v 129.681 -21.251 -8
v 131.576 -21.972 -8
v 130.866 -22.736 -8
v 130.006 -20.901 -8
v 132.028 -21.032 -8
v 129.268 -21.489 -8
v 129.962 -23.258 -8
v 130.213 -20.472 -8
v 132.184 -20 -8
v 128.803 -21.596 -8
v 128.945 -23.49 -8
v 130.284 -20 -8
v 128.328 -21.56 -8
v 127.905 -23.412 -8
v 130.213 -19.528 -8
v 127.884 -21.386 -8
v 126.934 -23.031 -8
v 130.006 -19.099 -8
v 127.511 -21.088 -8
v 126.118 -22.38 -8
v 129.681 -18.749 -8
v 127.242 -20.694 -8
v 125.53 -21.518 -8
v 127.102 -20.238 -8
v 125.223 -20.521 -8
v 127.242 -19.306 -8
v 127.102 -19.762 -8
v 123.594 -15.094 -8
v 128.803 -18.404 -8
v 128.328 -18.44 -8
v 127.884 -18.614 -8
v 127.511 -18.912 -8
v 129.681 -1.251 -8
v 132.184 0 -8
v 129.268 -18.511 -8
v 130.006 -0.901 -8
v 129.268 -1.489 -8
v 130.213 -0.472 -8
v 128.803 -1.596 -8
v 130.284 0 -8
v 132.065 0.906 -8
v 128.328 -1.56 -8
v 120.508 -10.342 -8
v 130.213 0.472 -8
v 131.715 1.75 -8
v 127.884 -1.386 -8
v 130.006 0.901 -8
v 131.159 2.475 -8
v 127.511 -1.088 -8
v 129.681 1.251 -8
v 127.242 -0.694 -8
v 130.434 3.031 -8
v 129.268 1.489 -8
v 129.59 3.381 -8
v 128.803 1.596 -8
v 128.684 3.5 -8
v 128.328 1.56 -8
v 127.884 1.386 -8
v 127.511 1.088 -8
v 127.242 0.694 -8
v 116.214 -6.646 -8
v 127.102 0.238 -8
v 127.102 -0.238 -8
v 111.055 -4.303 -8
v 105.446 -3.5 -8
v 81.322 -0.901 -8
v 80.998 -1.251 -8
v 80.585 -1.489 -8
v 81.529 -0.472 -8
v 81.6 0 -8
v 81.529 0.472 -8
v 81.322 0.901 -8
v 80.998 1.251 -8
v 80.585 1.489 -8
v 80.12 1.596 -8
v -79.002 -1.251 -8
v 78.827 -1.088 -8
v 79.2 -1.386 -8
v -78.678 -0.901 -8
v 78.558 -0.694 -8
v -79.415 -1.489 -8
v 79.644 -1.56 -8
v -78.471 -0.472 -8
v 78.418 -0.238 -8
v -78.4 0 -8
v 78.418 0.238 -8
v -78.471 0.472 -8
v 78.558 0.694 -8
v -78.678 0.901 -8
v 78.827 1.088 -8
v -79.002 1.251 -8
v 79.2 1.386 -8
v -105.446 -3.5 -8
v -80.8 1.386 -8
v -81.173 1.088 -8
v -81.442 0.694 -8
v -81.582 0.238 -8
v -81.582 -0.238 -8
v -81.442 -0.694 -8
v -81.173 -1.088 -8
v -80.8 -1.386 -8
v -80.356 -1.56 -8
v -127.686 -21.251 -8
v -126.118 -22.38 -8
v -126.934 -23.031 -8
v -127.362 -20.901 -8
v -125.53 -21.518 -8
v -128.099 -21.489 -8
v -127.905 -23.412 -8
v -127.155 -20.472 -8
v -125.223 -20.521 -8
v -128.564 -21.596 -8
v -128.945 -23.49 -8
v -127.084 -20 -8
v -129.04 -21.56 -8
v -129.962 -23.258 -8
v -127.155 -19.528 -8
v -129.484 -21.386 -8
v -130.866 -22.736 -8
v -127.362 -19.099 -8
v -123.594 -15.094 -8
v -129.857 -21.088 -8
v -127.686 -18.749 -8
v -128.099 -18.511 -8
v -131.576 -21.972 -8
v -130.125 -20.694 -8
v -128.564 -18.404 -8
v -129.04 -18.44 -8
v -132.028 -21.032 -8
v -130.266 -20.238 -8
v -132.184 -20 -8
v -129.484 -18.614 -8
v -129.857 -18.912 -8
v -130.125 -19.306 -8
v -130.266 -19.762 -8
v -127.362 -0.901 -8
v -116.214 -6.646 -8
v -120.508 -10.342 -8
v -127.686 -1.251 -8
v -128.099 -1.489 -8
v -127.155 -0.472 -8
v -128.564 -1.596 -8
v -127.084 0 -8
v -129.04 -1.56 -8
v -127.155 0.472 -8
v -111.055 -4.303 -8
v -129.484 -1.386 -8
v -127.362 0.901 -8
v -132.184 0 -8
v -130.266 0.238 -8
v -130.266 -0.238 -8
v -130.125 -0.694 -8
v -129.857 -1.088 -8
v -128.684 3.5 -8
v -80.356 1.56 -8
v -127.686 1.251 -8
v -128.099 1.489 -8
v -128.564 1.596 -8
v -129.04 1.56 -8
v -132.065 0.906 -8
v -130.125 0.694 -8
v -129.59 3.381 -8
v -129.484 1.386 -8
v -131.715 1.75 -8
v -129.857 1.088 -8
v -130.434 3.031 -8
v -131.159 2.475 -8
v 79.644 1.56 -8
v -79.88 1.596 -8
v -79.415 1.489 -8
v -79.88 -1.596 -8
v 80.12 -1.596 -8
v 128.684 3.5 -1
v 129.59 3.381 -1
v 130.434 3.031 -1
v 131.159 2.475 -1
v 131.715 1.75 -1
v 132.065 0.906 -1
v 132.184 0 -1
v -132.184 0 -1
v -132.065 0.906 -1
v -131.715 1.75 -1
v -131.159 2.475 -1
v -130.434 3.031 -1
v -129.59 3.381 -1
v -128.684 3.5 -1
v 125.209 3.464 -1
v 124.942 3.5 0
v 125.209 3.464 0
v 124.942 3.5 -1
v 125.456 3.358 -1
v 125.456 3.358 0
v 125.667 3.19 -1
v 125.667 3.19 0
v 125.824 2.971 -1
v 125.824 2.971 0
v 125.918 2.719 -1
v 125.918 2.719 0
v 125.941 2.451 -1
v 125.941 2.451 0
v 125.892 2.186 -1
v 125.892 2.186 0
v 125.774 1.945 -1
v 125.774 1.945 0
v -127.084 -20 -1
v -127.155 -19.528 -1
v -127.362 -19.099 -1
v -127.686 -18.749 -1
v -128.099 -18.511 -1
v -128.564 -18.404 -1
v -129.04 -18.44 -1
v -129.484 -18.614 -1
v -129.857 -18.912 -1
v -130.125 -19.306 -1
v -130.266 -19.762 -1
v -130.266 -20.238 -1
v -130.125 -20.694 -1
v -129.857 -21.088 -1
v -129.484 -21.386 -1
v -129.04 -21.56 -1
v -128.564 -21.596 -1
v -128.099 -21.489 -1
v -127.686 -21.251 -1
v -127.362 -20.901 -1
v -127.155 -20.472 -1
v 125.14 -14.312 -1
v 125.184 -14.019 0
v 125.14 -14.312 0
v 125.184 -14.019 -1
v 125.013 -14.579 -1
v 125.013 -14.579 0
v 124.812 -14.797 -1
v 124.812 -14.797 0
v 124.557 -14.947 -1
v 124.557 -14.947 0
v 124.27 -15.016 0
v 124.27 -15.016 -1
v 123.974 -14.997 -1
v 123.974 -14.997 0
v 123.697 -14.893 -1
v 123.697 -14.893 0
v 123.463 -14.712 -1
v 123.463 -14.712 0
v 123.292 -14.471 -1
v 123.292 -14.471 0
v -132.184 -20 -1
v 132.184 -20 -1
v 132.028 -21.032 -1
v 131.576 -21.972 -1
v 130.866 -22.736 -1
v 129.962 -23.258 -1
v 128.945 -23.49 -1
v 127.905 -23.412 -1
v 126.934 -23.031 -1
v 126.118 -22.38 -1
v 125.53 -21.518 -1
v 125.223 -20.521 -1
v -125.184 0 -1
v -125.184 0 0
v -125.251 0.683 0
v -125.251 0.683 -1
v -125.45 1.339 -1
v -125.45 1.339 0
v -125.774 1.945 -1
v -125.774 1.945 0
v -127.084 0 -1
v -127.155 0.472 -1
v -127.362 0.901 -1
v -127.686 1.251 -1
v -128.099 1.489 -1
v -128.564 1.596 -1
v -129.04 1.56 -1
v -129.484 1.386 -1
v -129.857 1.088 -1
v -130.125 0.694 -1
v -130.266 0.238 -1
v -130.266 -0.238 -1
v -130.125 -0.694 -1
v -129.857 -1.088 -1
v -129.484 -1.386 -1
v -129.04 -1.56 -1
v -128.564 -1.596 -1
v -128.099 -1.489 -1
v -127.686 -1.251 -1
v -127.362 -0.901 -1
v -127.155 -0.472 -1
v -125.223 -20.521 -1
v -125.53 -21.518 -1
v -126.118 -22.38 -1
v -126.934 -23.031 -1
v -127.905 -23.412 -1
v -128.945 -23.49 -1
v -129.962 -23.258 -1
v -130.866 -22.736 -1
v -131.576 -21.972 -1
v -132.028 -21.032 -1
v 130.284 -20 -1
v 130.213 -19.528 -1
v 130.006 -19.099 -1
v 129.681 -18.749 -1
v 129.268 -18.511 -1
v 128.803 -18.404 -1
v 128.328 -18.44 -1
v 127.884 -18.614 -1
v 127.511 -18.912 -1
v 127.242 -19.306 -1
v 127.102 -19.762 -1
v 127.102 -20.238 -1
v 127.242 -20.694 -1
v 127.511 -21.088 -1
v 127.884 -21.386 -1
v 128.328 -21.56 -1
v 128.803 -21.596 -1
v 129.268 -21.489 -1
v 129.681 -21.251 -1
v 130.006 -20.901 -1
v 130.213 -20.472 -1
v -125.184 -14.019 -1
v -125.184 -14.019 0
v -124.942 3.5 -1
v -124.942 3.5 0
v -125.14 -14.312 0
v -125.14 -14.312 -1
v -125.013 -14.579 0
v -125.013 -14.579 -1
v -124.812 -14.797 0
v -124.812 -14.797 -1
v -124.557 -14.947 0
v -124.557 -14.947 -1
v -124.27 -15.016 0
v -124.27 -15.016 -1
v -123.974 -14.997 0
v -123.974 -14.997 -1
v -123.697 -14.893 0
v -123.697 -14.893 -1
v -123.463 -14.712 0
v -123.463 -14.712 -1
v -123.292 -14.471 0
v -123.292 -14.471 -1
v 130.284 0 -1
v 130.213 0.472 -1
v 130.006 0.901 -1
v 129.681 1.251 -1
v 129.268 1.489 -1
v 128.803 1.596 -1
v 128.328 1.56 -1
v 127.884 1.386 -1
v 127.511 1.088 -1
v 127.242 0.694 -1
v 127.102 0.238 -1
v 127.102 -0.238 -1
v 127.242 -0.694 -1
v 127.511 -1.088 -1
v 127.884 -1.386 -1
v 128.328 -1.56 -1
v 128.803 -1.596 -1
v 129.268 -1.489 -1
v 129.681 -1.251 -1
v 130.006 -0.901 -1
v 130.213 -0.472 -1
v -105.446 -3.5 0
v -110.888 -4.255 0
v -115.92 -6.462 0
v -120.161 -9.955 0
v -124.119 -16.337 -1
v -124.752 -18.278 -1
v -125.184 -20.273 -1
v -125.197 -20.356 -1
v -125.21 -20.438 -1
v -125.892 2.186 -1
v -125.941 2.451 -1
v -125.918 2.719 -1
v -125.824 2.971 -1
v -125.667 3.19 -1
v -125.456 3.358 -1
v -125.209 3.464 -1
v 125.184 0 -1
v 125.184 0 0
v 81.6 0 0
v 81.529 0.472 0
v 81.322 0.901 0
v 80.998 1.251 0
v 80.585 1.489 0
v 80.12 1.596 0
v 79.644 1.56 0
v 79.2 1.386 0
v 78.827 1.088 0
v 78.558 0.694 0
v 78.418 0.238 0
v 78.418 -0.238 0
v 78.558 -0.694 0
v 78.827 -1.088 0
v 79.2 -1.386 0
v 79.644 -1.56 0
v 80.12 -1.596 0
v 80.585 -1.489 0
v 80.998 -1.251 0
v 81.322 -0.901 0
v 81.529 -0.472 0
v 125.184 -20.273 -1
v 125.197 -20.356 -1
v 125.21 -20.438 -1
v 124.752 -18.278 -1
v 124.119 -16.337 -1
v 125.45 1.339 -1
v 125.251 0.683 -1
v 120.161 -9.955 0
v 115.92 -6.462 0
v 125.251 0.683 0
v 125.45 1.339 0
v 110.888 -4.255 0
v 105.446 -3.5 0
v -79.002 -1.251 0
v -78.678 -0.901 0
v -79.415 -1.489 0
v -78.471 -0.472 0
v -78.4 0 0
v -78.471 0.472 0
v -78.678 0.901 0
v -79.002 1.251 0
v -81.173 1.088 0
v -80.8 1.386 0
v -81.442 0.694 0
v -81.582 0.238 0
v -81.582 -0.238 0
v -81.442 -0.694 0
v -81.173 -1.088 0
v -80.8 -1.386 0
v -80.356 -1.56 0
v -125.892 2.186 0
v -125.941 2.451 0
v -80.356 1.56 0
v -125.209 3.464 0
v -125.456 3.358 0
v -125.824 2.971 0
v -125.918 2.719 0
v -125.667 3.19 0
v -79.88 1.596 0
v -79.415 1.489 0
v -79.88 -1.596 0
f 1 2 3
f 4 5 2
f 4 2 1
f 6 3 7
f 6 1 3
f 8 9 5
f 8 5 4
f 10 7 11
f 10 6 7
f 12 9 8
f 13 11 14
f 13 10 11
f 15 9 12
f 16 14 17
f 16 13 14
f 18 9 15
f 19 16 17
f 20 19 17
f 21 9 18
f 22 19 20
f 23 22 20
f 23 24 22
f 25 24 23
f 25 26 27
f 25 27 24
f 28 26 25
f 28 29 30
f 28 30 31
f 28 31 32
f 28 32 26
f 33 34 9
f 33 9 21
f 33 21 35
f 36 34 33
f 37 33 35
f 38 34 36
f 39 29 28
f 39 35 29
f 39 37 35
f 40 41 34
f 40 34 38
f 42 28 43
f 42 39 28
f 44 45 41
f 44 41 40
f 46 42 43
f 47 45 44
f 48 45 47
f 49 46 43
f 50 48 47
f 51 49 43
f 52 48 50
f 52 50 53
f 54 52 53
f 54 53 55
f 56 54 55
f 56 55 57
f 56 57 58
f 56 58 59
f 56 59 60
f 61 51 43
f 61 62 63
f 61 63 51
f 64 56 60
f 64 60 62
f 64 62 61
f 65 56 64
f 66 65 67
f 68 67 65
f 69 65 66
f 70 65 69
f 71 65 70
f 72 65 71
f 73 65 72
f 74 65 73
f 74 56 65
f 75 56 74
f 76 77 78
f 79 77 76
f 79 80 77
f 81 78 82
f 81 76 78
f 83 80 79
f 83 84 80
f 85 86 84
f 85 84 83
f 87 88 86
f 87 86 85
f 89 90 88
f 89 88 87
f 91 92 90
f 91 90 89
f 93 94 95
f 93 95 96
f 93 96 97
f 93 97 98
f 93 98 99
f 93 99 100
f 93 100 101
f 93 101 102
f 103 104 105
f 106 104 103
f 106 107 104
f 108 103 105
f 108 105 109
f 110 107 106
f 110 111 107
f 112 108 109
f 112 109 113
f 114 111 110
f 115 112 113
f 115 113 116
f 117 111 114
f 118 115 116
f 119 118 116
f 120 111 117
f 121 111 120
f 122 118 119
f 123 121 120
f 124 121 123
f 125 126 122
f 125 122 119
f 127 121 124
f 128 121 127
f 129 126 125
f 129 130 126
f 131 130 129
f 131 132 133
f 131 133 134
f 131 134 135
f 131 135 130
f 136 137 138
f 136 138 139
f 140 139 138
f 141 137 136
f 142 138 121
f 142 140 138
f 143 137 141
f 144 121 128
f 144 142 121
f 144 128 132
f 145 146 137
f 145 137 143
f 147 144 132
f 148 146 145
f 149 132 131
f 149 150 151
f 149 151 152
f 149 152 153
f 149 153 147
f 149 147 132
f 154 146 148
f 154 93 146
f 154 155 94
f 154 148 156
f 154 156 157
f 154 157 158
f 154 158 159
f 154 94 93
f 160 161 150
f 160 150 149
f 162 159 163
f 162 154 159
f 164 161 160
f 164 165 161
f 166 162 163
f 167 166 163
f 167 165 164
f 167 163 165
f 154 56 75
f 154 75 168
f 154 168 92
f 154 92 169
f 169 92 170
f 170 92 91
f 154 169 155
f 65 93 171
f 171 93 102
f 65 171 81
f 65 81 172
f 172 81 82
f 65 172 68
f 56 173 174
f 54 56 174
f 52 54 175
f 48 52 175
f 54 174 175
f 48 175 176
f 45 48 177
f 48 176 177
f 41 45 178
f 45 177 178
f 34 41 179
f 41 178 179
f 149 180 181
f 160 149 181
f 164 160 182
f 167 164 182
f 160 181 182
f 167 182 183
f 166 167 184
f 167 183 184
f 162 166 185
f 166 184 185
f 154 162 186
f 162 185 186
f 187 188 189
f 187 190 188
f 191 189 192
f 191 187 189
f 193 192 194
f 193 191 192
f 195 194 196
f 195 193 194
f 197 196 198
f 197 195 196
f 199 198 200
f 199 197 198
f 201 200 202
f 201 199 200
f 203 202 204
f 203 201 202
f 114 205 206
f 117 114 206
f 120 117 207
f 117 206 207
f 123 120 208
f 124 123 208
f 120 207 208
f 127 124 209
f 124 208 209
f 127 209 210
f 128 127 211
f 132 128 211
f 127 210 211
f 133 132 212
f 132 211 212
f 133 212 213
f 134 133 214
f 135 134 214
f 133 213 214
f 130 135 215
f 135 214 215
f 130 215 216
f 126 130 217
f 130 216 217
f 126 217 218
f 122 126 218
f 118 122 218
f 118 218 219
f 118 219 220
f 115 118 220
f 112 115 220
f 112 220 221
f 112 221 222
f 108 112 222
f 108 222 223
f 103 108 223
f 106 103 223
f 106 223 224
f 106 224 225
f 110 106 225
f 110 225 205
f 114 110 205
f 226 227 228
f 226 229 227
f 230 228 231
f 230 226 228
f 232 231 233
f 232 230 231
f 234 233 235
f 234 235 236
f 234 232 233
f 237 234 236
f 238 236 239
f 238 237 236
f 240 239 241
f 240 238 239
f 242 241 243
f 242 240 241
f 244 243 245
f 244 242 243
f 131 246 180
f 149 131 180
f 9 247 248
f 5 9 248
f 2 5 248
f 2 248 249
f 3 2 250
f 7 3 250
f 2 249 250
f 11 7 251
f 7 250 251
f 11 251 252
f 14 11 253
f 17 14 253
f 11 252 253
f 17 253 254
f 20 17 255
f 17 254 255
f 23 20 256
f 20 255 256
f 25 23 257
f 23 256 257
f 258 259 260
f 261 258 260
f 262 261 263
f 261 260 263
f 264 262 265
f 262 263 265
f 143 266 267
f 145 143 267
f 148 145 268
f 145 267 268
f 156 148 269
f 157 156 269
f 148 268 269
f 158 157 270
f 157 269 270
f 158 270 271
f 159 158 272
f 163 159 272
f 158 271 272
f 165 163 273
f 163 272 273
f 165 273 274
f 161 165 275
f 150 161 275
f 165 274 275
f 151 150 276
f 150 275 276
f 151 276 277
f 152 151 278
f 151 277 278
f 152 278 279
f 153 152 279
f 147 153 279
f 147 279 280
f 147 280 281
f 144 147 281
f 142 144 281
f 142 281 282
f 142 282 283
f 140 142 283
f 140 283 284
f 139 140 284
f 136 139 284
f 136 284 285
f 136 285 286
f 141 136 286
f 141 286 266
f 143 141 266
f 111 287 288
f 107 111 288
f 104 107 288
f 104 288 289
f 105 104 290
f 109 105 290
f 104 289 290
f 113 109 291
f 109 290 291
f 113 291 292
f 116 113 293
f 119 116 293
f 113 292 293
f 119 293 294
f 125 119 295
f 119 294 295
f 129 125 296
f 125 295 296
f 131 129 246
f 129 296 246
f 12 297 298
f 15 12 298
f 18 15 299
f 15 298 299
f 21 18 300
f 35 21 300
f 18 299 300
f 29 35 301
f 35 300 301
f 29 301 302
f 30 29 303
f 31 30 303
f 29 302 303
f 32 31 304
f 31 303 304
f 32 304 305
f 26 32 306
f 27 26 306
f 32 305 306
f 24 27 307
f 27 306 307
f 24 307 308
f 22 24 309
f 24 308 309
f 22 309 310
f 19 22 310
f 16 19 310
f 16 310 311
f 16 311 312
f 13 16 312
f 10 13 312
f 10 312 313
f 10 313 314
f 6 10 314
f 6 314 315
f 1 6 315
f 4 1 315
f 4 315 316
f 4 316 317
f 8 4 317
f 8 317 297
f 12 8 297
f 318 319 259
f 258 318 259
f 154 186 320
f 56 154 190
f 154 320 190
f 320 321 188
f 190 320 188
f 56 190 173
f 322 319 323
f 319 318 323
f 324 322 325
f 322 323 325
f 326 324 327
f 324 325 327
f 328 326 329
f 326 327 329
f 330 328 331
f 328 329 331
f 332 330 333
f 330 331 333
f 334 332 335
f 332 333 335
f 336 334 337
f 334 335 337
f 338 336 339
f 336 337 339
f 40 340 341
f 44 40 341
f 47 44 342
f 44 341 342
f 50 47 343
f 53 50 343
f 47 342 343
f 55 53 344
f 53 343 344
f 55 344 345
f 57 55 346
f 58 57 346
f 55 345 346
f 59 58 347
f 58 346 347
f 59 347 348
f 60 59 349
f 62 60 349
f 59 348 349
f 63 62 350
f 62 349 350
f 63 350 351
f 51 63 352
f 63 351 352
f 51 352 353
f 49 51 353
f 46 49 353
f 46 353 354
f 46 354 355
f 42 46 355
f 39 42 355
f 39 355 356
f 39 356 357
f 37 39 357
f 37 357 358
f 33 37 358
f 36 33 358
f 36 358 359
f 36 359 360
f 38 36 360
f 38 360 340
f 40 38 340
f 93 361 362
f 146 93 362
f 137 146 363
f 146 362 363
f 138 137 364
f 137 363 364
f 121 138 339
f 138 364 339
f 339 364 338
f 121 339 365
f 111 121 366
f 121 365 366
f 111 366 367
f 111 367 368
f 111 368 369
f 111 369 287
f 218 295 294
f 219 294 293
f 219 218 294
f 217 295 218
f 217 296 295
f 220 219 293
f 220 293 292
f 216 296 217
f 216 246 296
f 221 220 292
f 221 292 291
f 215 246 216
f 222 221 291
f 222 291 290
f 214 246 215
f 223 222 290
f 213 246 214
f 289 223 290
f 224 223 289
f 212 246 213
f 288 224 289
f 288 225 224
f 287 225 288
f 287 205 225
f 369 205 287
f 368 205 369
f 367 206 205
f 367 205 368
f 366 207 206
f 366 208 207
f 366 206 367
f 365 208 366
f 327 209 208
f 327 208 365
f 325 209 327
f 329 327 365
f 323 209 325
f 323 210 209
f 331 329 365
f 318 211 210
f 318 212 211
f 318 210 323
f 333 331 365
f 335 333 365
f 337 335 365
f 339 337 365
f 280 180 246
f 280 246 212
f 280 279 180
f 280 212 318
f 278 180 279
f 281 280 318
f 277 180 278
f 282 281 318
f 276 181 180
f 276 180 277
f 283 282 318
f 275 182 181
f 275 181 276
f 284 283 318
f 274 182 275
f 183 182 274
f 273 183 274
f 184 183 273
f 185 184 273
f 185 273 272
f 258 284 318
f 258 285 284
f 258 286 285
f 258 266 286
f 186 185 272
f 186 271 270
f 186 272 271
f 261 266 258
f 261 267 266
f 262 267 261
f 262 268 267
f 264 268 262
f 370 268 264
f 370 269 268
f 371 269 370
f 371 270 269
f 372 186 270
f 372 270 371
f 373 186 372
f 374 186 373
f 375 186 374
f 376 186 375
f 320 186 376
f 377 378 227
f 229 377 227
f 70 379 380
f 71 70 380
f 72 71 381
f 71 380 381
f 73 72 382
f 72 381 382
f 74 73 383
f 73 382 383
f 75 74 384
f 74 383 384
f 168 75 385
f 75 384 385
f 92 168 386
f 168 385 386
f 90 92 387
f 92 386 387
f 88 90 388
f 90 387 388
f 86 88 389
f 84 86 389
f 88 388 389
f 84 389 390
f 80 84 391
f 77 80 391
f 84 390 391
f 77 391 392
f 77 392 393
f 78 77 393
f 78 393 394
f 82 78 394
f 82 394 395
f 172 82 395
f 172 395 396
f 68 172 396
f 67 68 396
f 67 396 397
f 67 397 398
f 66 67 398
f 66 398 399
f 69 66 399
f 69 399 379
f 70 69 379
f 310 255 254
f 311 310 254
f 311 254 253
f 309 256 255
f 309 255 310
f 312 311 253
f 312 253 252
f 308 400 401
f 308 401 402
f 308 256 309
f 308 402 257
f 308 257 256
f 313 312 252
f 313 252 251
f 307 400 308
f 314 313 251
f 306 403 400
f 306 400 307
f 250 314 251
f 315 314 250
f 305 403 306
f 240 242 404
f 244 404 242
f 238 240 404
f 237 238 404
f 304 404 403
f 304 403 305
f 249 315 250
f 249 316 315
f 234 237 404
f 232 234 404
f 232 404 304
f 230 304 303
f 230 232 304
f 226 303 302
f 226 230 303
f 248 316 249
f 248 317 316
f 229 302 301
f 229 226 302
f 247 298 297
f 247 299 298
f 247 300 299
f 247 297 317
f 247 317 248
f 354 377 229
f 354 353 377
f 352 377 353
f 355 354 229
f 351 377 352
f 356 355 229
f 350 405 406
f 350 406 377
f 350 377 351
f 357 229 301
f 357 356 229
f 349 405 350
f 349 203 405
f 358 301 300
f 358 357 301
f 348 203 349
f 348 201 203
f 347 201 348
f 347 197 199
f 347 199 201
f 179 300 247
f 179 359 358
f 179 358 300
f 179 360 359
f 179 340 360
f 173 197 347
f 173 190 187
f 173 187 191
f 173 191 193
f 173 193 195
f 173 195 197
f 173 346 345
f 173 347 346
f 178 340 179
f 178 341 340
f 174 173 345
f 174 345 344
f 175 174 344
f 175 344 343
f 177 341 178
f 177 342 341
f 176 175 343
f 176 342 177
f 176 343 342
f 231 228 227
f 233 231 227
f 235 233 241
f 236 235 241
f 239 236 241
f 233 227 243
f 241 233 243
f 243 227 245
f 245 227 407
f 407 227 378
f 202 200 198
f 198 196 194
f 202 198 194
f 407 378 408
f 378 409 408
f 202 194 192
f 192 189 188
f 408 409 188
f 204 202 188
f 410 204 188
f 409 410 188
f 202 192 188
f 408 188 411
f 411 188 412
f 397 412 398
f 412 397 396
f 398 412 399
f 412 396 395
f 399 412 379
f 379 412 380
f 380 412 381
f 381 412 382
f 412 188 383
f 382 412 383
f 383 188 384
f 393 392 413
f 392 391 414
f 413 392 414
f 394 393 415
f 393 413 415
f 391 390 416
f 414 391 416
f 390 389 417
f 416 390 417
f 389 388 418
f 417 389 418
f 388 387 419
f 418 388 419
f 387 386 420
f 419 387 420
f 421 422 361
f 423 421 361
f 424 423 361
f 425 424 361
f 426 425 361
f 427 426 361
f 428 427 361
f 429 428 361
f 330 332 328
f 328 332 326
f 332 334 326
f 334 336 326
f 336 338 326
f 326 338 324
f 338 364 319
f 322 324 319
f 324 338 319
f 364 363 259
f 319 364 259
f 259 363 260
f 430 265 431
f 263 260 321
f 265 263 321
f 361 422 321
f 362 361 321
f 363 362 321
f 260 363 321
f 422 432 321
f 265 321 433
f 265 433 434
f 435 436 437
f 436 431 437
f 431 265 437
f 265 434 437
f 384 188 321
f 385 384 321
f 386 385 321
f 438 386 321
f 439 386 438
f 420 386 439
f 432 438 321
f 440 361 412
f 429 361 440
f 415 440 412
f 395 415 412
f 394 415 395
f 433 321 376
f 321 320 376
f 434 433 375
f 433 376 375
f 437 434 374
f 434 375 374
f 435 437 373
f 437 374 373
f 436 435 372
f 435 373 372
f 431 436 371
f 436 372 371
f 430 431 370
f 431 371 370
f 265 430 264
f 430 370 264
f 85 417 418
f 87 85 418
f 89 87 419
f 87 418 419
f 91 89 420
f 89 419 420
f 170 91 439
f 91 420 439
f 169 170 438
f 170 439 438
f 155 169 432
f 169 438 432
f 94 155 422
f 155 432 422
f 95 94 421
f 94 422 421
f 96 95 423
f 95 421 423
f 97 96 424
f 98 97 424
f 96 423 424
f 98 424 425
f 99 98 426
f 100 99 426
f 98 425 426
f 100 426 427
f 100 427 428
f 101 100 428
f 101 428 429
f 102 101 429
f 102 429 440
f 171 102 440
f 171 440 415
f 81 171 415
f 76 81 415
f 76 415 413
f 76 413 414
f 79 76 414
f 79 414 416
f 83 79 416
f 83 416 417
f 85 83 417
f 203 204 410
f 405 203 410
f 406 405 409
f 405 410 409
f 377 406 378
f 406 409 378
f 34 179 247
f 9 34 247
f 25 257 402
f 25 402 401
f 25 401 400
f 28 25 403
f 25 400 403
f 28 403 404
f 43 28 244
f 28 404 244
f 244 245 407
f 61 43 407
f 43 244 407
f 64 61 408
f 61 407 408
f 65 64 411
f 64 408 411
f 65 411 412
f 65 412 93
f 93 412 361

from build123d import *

# Parameters (mm, degrees)
EXTRUDE_1_DEPTH     = 8
CUT_EXTRUDE_1_DEPTH = 1
FILLET_1_R          = 1
HOLE_WIZARD_M3_1_D  = 3.2


with BuildPart() as part:
    # ｽｹｯﾁ1 → ﾎﾞｽ - 押し出し1 (new body)
    with BuildSketch(Plane.XY):
        with BuildLine():
            Line((-128.683849372, 3.5), (128.683849372, 3.5))
            ThreePointArc((128.683849372, 3.5), (131.158723106, 2.474873734), (132.183849372, 0))
            Line((132.183849372, 0), (132.183849372, -20))
            ThreePointArc((132.183849372, -20), (128.945217461, -23.490227317), (125.222885531, -20.521276596))
            ThreePointArc((125.222885531, -20.521276596), (118.492510756, -8.341265421), (105.445949295, -3.5))
            Line((105.445949295, -3.5), (-105.445949295, -3.5))
            ThreePointArc((-105.445949295, -3.5), (-118.492510756, -8.341265421), (-125.222885531, -20.521276596))
            ThreePointArc((-125.222885531, -20.521276596), (-128.945217461, -23.490227317), (-132.183849372, -20))
            Line((-132.183849372, -20), (-132.183849372, 0))
            ThreePointArc((-132.183849372, 0), (-131.158723106, 2.474873734), (-128.683849372, 3.5))
        make_face()
    extrude(amount=-EXTRUDE_1_DEPTH)

    # ｽｹｯﾁ1<4> → ｶｯﾄ - 押し出し1 (cut)
    with BuildSketch(Plane.XY):
        with BuildLine():
            ThreePointArc((-125.183849372, 0), (-126.208975638, 2.474873734), (-128.683849372, 3.5))
            ThreePointArc((-128.683849372, 3.5), (-131.158723106, 2.474873734), (-132.183849372, 0))
            Line((-132.183849372, 0), (-132.183849372, -20))
            ThreePointArc((-132.183849372, -20), (-128.945217461, -23.490227317), (-125.222885531, -20.521276596))
            ThreePointArc((-125.222885531, -20.521276596), (-125.203758298, -20.396939676), (-125.183849372, -20.272725524))
            Line((-125.183849372, -20.272725524), (-125.183849372, 0))
        make_face()
        with BuildLine():
            Line((125.183849372, 0), (125.183849372, -20.272725524))
            ThreePointArc((125.183849372, -20.272725524), (125.203758298, -20.396939676), (125.222885531, -20.521276596))
            ThreePointArc((125.222885531, -20.521276596), (128.945217461, -23.490227317), (132.183849372, -20))
            Line((132.183849372, -20), (132.183849372, 0))
            ThreePointArc((132.183849372, 0), (131.158723106, 2.474873734), (128.683849372, 3.5))
            ThreePointArc((128.683849372, 3.5), (126.208975638, 2.474873734), (125.183849372, 0))
        make_face()
    extrude(amount=-CUT_EXTRUDE_1_DEPTH, mode=Mode.SUBTRACT)

    # ﾌｨﾚｯﾄ1
    fillet_1_edges = [part.edges().sort_by_distance(p)[0] for p in [
        (-128.683849372, 3.5, -0.5),
        (-125.183849372, -20.272725524, -0.5),
        (128.683849372, 3.5, -0.5),
        (125.183849372, -20.272725524, -0.5),
    ]]
    fillet(fillet_1_edges, radius=FILLET_1_R - 0.0001)  # a hair under: the kernel refuses the full size

    # M3 すきま穴1 (through all)
    with Locations(Plane(origin=(-128.683849372, -20, -8), x_dir=(-1, 0, 0), z_dir=(0, 0, -1))):
        with Locations((0, 0), (0, 20), (-48.683849372, 20), (-257.367698744, 0), (-257.367698744, 20), (-208.683849372, 20)):
            Hole(HOLE_WIZARD_M3_1_D / 2)


solid = part.part
